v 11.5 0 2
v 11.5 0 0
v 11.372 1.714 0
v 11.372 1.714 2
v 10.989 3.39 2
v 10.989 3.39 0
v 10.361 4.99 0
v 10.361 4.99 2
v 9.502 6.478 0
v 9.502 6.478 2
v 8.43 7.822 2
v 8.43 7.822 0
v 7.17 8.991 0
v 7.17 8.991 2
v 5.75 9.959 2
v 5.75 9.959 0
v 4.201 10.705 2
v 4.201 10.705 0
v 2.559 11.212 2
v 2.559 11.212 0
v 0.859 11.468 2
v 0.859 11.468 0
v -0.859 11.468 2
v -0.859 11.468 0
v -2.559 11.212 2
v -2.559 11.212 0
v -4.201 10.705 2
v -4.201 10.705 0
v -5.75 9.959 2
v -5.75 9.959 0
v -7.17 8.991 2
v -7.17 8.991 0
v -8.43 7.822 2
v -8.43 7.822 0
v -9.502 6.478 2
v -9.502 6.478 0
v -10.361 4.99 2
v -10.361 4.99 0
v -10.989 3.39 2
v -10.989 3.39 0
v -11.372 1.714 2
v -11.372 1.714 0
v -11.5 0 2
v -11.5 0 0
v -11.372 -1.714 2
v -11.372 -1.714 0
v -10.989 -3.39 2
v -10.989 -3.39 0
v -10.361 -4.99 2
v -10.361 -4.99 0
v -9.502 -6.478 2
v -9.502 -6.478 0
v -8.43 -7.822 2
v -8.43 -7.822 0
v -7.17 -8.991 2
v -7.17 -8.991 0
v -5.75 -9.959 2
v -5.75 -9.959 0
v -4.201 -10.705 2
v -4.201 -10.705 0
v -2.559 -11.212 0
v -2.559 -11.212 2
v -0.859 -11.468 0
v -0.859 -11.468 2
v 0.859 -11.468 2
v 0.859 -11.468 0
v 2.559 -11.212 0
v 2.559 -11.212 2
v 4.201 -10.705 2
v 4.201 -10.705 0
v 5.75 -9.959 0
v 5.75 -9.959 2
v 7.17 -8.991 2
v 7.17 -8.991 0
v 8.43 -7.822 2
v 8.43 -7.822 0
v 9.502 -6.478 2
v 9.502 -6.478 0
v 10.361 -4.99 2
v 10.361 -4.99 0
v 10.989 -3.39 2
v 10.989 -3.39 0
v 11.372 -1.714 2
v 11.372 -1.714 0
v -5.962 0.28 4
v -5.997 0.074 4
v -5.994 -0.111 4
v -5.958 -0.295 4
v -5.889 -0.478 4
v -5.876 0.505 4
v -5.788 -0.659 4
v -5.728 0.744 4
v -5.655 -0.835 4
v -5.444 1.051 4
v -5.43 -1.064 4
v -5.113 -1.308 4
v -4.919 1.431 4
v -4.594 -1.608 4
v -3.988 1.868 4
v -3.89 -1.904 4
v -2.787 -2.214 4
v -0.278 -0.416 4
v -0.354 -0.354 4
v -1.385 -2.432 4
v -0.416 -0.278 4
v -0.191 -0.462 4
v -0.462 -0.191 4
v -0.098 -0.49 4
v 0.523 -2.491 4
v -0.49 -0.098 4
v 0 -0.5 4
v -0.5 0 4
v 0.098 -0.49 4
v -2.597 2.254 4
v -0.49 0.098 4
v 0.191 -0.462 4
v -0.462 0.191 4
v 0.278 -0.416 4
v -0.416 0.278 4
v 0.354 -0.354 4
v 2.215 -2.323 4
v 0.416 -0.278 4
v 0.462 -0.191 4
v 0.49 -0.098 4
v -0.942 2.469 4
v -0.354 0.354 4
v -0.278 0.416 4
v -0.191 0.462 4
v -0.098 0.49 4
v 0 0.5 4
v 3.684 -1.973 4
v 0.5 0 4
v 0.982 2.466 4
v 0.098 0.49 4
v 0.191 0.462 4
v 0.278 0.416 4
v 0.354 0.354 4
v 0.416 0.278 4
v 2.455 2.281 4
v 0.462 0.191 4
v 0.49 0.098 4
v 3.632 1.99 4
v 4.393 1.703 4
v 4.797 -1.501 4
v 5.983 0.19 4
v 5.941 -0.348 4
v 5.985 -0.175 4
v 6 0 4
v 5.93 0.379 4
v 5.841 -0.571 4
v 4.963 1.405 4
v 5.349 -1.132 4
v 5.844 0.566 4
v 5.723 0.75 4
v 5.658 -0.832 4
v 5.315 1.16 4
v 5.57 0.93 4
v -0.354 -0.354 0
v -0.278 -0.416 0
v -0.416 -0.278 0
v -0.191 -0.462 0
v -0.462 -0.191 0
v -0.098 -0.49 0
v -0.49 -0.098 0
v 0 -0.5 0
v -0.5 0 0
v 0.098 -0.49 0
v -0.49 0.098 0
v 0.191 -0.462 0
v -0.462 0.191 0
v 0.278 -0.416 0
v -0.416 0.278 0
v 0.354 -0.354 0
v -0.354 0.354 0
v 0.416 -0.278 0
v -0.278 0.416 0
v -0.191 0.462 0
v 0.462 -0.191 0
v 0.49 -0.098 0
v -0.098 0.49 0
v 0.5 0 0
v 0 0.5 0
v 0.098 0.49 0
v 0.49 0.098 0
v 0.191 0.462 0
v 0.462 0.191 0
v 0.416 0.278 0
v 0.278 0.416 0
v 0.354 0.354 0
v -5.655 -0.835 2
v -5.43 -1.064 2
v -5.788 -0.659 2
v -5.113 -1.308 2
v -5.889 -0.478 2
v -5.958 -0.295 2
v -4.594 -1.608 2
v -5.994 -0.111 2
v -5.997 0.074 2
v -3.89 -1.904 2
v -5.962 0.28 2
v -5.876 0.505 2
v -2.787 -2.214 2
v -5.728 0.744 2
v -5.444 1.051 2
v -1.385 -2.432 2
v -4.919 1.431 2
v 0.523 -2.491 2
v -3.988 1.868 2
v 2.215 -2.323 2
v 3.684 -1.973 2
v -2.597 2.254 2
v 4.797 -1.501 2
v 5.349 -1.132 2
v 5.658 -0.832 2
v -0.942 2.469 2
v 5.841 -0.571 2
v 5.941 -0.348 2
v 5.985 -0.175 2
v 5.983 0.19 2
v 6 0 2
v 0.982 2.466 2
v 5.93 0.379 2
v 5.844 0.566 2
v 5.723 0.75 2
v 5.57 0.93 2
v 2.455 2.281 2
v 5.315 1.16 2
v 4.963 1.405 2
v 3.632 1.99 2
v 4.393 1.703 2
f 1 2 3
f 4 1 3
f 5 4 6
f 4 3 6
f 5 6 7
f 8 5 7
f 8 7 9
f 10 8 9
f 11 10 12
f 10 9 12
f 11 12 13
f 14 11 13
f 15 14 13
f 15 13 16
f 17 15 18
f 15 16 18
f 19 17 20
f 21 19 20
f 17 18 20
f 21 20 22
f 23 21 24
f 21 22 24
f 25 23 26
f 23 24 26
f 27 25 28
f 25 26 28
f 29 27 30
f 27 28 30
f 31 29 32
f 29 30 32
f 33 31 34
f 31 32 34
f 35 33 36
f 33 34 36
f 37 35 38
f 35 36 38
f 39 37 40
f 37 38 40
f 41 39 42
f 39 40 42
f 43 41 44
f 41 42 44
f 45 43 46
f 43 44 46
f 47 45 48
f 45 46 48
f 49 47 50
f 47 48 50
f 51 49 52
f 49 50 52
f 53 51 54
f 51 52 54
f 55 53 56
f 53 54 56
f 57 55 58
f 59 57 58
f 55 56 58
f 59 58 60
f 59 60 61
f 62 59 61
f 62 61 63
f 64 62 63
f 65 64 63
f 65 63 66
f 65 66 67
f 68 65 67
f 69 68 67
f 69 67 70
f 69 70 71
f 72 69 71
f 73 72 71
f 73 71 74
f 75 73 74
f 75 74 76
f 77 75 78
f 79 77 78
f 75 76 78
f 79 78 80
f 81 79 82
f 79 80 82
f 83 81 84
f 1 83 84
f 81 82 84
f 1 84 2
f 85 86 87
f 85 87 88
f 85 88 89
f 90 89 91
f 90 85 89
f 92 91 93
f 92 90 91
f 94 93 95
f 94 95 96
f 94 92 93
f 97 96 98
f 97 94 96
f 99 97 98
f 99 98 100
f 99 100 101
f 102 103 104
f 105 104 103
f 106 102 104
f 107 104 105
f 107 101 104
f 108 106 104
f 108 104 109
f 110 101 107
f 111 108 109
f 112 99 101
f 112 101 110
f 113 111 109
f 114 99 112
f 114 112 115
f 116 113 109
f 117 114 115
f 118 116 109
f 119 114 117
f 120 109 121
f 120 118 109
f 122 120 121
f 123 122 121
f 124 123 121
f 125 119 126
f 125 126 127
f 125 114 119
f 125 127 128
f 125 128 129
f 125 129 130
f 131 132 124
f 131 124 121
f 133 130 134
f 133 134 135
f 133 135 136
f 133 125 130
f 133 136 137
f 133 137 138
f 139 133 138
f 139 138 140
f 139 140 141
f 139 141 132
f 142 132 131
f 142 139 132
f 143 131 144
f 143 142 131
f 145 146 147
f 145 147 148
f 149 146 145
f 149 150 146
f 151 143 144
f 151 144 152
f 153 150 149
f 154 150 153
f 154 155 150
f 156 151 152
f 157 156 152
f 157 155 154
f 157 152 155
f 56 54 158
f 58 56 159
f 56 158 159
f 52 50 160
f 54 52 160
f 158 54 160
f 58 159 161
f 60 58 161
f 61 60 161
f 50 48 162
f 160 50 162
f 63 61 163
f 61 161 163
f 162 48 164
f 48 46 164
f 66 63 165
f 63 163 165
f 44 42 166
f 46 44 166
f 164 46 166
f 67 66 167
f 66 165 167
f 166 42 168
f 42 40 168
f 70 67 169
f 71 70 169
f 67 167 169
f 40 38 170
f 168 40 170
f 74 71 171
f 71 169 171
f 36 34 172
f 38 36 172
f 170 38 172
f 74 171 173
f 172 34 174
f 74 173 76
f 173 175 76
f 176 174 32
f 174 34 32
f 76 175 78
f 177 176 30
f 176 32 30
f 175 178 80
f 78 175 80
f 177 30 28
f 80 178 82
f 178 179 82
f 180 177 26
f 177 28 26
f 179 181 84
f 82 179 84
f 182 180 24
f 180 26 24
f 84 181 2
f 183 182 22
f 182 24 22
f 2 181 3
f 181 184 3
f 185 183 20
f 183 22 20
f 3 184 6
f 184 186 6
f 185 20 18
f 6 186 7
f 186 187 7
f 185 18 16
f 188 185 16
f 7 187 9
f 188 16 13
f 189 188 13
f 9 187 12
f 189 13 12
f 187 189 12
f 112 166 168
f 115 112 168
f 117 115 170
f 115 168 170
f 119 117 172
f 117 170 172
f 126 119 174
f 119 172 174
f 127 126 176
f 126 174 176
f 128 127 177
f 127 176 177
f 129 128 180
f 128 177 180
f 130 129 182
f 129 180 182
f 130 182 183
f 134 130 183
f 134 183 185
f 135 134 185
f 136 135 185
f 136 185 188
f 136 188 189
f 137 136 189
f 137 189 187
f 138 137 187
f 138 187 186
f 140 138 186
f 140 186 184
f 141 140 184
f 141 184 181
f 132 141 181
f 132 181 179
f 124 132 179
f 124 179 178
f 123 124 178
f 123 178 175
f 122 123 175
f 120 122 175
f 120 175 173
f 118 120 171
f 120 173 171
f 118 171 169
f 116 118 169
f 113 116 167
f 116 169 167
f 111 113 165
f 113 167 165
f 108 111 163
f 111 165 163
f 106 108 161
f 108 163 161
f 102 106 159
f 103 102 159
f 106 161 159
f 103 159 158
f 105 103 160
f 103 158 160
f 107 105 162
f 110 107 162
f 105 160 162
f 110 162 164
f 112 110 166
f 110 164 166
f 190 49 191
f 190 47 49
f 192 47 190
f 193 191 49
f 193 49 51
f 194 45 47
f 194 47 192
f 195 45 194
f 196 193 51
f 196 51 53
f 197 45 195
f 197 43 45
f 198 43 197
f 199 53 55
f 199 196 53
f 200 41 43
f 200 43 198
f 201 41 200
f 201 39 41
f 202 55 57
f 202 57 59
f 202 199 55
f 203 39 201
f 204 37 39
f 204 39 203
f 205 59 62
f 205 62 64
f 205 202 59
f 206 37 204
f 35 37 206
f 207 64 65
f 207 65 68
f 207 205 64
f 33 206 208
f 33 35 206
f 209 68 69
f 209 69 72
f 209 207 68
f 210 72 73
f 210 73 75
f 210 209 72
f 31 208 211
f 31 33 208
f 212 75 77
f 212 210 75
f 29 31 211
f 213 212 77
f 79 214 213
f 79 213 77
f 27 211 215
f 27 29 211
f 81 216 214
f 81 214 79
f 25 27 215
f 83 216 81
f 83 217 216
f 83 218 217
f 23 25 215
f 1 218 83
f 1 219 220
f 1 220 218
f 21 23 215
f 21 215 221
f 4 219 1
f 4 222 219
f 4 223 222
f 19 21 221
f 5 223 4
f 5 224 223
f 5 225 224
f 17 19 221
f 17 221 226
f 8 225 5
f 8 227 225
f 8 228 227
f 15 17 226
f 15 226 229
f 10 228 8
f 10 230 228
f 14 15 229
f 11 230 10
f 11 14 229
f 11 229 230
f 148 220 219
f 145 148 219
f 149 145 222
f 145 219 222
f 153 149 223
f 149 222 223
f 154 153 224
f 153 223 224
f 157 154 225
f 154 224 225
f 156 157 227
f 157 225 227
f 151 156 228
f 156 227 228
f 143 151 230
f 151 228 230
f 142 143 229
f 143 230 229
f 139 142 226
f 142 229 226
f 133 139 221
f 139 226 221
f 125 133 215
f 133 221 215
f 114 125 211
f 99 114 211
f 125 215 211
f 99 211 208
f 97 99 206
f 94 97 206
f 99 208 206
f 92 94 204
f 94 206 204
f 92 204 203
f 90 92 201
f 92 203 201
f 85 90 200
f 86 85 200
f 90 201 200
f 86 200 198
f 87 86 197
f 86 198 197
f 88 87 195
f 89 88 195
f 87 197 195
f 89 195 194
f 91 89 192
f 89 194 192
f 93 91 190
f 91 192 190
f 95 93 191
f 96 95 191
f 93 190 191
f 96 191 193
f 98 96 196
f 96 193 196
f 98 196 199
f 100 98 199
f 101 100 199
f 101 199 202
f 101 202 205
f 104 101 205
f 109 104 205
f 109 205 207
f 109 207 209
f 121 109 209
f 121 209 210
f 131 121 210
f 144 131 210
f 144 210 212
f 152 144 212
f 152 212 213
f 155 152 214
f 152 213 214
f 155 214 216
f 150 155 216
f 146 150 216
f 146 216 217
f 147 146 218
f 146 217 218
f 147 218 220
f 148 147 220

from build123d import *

# Parameters (mm, degrees)
ESQUISSE1_R             = 11.5
BOSS_EXTRU_1_DEPTH      = 2
ESQUISSE6_RX            = 6
ESQUISSE6_RY            = 2.5
BOSS_EXTRU_5_DEPTH      = 2
ESQUISSE7_R             = 0.5
ENL_V_MAT_EXTRU_1_DEPTH = 17.748134224


with BuildPart() as part:
    # Esquisse1 → Boss.-Extru.1 (new body)
    with BuildSketch(Plane.XY):
        Circle(ESQUISSE1_R)
    extrude(amount=BOSS_EXTRU_1_DEPTH)

    # Esquisse6 → Boss.-Extru.5 (add)
    with BuildSketch(Plane.XY.offset(2)):
        with Locations((0, 0)):
            Ellipse(ESQUISSE6_RX, ESQUISSE6_RY)
    extrude(amount=BOSS_EXTRU_5_DEPTH)

    # Esquisse7 → Enlèv. mat.-Extru.1 (cut, through all)
    with BuildSketch(Plane(origin=(0, 0, 0), x_dir=(-1, 0, 0), z_dir=(0, 0, -1))):
        Circle(ESQUISSE7_R)
    extrude(amount=-ENL_V_MAT_EXTRU_1_DEPTH, mode=Mode.SUBTRACT)


solid = part.part
